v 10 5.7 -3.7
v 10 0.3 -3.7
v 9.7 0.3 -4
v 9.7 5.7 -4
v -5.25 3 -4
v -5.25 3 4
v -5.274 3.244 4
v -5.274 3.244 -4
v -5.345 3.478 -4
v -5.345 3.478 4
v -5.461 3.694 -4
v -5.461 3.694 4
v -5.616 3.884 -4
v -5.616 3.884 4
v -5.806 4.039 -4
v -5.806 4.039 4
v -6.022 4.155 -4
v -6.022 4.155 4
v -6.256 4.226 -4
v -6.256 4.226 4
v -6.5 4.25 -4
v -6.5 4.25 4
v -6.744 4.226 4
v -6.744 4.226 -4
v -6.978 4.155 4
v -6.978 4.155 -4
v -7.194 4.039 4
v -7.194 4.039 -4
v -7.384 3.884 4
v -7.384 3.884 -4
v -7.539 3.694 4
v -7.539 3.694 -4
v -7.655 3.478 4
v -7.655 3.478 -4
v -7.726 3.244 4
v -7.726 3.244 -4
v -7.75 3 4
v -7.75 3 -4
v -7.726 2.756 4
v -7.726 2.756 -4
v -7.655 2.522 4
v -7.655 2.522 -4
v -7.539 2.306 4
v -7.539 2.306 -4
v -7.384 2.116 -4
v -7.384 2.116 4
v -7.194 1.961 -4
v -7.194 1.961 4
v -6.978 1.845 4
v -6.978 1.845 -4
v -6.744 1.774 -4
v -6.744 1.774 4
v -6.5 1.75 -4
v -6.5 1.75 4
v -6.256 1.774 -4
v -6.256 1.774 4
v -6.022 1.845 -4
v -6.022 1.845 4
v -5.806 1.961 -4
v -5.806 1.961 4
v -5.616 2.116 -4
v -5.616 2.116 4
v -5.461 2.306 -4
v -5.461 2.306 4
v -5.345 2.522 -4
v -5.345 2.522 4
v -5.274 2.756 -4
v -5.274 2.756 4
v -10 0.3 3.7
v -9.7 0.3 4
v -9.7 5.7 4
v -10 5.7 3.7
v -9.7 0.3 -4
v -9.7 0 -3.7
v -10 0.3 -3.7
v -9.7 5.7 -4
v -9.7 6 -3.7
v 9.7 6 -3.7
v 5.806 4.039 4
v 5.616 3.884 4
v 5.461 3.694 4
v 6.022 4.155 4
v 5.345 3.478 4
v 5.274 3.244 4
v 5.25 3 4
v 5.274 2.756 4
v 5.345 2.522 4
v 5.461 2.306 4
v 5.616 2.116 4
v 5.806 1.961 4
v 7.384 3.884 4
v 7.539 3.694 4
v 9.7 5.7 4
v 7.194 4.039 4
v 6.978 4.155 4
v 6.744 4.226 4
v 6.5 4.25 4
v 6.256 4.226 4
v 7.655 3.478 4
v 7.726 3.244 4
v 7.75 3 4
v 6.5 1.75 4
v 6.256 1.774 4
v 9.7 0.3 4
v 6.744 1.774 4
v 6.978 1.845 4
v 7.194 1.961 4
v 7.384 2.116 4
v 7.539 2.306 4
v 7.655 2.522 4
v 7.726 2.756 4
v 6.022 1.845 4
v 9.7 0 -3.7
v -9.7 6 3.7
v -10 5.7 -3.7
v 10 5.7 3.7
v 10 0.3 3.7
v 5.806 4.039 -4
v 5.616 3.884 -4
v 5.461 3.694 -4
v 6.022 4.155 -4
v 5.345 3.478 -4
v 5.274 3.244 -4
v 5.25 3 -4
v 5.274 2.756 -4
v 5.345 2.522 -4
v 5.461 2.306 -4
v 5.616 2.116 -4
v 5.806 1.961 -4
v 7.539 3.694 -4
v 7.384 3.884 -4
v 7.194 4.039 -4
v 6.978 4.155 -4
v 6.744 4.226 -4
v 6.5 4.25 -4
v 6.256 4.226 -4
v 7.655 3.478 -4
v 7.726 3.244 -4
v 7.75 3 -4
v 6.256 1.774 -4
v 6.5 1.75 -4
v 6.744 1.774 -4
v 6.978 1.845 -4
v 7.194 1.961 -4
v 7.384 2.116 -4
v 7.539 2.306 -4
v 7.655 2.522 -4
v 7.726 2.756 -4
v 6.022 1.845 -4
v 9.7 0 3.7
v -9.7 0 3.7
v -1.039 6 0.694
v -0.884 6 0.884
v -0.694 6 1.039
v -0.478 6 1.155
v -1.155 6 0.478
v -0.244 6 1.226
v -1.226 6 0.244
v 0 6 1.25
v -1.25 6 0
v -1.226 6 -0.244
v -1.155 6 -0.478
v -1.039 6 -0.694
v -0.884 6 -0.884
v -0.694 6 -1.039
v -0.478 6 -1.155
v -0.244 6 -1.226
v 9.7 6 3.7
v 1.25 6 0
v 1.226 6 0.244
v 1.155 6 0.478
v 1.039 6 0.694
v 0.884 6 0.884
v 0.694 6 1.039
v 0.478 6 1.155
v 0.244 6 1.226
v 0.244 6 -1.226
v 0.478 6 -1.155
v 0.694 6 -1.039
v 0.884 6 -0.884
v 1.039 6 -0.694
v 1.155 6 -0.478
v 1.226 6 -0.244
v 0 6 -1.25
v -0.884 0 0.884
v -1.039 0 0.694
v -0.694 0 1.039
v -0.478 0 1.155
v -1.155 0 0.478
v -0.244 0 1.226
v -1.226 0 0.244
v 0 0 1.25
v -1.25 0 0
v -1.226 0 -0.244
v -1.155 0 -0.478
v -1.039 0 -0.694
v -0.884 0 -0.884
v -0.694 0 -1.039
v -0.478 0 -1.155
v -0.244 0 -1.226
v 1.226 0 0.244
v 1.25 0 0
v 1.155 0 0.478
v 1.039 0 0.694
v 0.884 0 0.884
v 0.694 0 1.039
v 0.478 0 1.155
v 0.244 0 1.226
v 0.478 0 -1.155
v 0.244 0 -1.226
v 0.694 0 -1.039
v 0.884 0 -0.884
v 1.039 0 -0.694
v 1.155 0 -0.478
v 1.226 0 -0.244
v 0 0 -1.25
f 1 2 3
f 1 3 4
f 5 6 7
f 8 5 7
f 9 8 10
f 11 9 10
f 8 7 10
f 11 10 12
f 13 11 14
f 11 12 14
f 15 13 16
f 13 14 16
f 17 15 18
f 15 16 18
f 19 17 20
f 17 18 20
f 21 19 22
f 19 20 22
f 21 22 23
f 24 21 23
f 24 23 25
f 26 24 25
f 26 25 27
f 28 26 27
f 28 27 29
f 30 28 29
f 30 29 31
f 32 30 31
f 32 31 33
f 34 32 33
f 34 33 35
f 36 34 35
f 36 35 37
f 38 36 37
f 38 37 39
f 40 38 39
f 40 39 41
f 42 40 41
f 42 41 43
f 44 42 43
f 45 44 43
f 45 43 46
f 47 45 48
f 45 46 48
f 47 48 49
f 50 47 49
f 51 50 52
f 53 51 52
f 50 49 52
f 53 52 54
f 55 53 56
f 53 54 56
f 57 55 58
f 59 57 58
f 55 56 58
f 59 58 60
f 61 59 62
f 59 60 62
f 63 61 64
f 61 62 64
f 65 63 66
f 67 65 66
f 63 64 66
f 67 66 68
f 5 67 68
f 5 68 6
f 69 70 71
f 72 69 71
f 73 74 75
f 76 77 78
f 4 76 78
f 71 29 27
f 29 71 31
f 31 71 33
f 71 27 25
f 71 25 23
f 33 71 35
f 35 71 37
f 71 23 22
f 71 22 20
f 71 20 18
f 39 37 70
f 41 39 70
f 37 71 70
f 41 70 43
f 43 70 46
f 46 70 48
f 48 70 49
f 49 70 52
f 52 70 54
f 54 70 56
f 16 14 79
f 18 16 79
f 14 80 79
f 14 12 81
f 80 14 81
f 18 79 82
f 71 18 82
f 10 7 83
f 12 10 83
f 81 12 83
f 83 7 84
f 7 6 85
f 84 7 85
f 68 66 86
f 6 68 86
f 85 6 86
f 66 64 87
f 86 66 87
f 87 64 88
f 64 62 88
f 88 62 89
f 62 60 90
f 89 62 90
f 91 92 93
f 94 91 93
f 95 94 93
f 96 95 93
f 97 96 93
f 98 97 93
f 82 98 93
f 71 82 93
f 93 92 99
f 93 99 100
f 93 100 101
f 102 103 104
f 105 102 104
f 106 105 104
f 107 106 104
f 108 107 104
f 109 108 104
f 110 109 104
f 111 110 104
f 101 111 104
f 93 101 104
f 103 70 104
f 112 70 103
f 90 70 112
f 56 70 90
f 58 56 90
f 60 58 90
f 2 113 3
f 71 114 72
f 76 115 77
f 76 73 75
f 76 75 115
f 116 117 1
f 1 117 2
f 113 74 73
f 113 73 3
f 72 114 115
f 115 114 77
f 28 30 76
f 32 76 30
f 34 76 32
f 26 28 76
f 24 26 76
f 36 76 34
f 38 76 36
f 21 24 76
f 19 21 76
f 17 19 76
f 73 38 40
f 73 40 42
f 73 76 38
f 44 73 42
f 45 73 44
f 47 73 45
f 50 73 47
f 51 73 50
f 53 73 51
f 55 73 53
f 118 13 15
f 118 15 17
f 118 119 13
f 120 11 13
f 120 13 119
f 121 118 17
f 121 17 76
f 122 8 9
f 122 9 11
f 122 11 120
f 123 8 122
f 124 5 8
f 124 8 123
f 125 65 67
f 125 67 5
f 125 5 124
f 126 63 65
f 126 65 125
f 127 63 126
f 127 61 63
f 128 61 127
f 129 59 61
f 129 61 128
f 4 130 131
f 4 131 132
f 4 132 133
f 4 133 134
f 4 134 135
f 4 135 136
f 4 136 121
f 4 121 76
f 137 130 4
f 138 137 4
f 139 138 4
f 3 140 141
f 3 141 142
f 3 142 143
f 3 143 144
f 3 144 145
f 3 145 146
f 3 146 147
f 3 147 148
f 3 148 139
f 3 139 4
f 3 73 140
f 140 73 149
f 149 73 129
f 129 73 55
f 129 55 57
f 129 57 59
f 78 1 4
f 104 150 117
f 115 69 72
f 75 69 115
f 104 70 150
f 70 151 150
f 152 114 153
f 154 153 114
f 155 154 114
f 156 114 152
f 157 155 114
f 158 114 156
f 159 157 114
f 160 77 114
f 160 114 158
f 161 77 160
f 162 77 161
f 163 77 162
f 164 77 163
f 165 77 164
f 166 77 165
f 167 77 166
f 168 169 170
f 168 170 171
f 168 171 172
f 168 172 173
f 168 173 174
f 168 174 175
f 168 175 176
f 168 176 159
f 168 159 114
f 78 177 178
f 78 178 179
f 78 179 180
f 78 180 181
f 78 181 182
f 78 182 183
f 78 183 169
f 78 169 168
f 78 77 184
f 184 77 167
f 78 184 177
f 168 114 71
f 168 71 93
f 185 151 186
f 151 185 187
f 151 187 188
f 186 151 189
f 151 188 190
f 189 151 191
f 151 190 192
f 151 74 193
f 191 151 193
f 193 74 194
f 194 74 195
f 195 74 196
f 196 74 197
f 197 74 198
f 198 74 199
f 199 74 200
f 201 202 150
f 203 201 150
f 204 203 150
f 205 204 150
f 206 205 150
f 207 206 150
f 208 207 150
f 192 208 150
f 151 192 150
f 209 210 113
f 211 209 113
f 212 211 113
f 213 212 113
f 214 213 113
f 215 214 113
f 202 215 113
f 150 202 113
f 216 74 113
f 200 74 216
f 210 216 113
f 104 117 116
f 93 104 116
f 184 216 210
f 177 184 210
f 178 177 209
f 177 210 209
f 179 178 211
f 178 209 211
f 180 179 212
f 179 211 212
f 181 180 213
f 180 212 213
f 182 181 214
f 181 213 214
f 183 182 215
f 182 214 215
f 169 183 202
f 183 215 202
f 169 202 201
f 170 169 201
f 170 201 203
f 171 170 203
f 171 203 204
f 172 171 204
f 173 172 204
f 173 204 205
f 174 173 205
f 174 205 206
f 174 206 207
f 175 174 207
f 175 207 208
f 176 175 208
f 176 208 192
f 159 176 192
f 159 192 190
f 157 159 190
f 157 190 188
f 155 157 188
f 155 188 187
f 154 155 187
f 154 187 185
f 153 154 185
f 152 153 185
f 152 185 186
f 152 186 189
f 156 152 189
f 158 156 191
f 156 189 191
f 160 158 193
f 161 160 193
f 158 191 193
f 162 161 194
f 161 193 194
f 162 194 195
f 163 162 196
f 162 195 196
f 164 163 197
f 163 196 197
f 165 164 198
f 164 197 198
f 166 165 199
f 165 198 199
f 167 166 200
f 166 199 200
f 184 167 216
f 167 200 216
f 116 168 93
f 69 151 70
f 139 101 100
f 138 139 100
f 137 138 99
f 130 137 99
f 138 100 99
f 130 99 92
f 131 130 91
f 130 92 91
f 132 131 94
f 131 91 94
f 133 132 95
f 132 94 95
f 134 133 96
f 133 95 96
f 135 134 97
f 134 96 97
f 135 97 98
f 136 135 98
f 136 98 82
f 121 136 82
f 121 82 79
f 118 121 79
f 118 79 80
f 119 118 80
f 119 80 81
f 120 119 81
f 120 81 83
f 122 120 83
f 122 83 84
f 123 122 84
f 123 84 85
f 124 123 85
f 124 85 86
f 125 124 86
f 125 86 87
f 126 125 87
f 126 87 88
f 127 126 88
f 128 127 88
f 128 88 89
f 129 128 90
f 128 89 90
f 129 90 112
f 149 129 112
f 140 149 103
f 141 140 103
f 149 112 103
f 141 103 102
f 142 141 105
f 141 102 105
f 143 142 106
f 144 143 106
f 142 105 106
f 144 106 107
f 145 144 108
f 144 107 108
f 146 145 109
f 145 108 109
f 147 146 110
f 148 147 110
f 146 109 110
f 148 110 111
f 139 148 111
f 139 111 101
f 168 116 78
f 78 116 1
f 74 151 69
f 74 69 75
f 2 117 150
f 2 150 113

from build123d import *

# Parameters (mm, degrees)
SKETCH_1_W         = 20
SKETCH_1_H         = 8
EXTRUDE_1_DEPTH    = 6
HOLE_WIZARD_M3_1_D = 2.5
HOLE_WIZARD_M3_2_D = 2.5
CHAMFER_1_SIZE     = 0.3


with BuildPart() as part:
    # 草图1 → 凸台-拉伸1 (new body)
    with BuildSketch(Plane(origin=(0, 0, 0), x_dir=(1, 0, 0), z_dir=(0, 1, 0))):
        Rectangle(SKETCH_1_W, SKETCH_1_H)
    extrude(amount=EXTRUDE_1_DEPTH)

    # M3 螺纹孔1 (through all)
    with Locations(Plane(origin=(6.5, 3, -4), x_dir=(-1, 0, 0), z_dir=(0, 0, -1))):
        with Locations((0, 0), (13, 0)):
            Hole(HOLE_WIZARD_M3_1_D / 2)

    # M3 螺纹孔2 (through all)
    with Locations(Plane.ZX.offset(6)):
        with Locations((0, 0)):
            Hole(HOLE_WIZARD_M3_2_D / 2)

    # 倒角1
    chamfer_1_edges = [part.edges().sort_by_distance(p)[0] for p in [
        (-10, 6, 0),
        (0, 6, 4),
        (10, 6, 0),
        (0, 0, 4),
        (-10, 0, 0),
        (0, 0, -4),
        (10, 0, 0),
        (10, 3, 4),
        (-10, 3, 4),
        (-10, 3, -4),
        (10, 3, -4),
        (0, 6, -4),
    ]]
    chamfer(chamfer_1_edges, length=CHAMFER_1_SIZE)


solid = part.part
